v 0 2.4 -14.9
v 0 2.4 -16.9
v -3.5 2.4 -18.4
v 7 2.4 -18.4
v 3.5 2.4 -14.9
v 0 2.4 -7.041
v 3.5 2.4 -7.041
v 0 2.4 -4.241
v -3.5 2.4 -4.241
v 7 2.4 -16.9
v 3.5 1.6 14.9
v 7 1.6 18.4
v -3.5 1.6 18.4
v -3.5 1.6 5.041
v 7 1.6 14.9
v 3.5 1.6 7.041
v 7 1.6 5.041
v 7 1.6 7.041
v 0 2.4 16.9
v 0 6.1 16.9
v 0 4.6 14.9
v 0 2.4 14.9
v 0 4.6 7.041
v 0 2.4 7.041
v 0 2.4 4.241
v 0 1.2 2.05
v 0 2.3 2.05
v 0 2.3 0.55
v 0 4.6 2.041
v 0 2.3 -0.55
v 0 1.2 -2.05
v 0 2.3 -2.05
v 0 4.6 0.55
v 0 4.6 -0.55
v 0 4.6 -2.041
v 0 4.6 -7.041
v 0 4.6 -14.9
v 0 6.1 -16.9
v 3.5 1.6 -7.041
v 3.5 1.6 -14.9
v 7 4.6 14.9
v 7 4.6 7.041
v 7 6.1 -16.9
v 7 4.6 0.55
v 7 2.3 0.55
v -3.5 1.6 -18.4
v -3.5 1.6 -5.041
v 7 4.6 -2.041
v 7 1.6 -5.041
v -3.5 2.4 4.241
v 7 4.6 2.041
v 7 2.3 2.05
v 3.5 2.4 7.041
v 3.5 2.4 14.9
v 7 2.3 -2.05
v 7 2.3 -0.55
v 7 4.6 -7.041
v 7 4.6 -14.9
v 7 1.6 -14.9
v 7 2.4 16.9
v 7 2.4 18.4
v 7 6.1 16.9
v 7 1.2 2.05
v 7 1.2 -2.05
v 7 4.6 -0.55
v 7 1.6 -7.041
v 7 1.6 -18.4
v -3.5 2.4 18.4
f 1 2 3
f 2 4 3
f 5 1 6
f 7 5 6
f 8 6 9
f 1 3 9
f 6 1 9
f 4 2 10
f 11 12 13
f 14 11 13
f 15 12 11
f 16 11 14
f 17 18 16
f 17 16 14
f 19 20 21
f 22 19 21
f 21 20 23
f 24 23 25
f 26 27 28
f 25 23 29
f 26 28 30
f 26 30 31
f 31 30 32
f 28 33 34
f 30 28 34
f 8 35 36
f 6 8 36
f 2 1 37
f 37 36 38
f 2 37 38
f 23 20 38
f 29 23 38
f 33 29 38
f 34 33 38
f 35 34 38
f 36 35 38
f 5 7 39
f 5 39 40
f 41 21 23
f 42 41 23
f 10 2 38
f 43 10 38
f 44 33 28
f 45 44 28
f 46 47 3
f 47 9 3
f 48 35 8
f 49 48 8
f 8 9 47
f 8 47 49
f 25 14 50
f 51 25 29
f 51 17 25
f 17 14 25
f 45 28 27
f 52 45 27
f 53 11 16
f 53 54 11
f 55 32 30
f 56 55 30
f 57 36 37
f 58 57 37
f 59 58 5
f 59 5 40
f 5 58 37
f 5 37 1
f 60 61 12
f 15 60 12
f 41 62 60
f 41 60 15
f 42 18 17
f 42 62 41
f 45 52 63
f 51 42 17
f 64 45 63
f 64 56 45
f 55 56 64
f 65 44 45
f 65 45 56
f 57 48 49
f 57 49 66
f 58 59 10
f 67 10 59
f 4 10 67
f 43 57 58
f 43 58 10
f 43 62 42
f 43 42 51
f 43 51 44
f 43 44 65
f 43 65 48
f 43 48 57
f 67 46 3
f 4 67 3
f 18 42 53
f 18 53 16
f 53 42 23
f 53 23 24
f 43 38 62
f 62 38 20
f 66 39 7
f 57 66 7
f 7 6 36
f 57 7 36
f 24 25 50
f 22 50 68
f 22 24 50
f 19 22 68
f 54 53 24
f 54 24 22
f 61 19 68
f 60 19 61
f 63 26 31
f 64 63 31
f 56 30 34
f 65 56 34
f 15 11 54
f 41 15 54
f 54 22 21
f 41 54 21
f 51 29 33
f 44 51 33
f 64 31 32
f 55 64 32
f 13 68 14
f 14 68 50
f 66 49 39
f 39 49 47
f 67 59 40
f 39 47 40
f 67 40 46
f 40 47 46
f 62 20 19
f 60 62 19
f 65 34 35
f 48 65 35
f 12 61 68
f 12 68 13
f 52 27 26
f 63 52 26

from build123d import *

# Parameters (mm, degrees)
BOSS_EXTRUDE1_DEPTH = 7
SKETCH1_3_W         = 7.858578644
SKETCH1_3_H         = 0.8
BOSS_EXTRUDE2_DEPTH = 3.5


with BuildPart() as part:
    # Sketch1 → Boss-Extrude1 (new body)
    with BuildSketch(Plane(origin=(0, 0, 0), x_dir=(0, 0, -1), z_dir=(1, 0, 0))):
        Polygon((-14.9, 4.6), (-7.041421356, 4.6), (-7.041421356, 1.6), (-5.041421356, 1.6), (-2.041421356, 4.6), (-0.55, 4.6), (-0.55, 2.3), (-2.05, 2.3), (-2.05, 1.2), (2.05, 1.2), (2.05, 2.3), (0.55, 2.3), (0.55, 4.6), (2.041421356, 4.6), (5.041421356, 1.6), (7.041421356, 1.6), (7.041421356, 4.6), (14.9, 4.6), (14.9, 1.6), (18.4, 1.6), (18.4, 2.4), (16.9, 2.4), (16.9, 6.1), (-16.9, 6.1), (-16.9, 2.4), (-18.4, 2.4), (-18.4, 1.6), (-14.9, 1.6), align=None)
    extrude(amount=BOSS_EXTRUDE1_DEPTH)

    # Sketch1<3> → Boss-Extrude2 (add, symmetric)
    with BuildSketch(Plane(origin=(0, 0, 0), x_dir=(0, 0, -1), z_dir=(1, 0, 0))):
        Polygon((7.041421356, 2.4), (4.241421356, 2.4), (5.041421356, 1.6), (7.041421356, 1.6), align=None)
        Polygon((17, 2.4), (16.9, 2.4), (14.9, 2.4), (14.9, 1.6), (17, 1.6), (18.4, 1.6), (18.4, 2.4), align=None)
        with Locations((10.970710678, 2)):
            Rectangle(SKETCH1_3_W, SKETCH1_3_H)
        with Locations((-10.970710678, 2)):
            Rectangle(SKETCH1_3_W, SKETCH1_3_H)
        Polygon((-4.241421356, 2.4), (-7.041421356, 2.4), (-7.041421356, 1.6), (-5.041421356, 1.6), align=None)
        Polygon((-14.9, 1.6), (-14.9, 2.4), (-16.9, 2.4), (-17, 2.4), (-18.4, 2.4), (-18.4, 1.6), (-17, 1.6), align=None)
    extrude(amount=BOSS_EXTRUDE2_DEPTH, both=True)


solid = part.part
